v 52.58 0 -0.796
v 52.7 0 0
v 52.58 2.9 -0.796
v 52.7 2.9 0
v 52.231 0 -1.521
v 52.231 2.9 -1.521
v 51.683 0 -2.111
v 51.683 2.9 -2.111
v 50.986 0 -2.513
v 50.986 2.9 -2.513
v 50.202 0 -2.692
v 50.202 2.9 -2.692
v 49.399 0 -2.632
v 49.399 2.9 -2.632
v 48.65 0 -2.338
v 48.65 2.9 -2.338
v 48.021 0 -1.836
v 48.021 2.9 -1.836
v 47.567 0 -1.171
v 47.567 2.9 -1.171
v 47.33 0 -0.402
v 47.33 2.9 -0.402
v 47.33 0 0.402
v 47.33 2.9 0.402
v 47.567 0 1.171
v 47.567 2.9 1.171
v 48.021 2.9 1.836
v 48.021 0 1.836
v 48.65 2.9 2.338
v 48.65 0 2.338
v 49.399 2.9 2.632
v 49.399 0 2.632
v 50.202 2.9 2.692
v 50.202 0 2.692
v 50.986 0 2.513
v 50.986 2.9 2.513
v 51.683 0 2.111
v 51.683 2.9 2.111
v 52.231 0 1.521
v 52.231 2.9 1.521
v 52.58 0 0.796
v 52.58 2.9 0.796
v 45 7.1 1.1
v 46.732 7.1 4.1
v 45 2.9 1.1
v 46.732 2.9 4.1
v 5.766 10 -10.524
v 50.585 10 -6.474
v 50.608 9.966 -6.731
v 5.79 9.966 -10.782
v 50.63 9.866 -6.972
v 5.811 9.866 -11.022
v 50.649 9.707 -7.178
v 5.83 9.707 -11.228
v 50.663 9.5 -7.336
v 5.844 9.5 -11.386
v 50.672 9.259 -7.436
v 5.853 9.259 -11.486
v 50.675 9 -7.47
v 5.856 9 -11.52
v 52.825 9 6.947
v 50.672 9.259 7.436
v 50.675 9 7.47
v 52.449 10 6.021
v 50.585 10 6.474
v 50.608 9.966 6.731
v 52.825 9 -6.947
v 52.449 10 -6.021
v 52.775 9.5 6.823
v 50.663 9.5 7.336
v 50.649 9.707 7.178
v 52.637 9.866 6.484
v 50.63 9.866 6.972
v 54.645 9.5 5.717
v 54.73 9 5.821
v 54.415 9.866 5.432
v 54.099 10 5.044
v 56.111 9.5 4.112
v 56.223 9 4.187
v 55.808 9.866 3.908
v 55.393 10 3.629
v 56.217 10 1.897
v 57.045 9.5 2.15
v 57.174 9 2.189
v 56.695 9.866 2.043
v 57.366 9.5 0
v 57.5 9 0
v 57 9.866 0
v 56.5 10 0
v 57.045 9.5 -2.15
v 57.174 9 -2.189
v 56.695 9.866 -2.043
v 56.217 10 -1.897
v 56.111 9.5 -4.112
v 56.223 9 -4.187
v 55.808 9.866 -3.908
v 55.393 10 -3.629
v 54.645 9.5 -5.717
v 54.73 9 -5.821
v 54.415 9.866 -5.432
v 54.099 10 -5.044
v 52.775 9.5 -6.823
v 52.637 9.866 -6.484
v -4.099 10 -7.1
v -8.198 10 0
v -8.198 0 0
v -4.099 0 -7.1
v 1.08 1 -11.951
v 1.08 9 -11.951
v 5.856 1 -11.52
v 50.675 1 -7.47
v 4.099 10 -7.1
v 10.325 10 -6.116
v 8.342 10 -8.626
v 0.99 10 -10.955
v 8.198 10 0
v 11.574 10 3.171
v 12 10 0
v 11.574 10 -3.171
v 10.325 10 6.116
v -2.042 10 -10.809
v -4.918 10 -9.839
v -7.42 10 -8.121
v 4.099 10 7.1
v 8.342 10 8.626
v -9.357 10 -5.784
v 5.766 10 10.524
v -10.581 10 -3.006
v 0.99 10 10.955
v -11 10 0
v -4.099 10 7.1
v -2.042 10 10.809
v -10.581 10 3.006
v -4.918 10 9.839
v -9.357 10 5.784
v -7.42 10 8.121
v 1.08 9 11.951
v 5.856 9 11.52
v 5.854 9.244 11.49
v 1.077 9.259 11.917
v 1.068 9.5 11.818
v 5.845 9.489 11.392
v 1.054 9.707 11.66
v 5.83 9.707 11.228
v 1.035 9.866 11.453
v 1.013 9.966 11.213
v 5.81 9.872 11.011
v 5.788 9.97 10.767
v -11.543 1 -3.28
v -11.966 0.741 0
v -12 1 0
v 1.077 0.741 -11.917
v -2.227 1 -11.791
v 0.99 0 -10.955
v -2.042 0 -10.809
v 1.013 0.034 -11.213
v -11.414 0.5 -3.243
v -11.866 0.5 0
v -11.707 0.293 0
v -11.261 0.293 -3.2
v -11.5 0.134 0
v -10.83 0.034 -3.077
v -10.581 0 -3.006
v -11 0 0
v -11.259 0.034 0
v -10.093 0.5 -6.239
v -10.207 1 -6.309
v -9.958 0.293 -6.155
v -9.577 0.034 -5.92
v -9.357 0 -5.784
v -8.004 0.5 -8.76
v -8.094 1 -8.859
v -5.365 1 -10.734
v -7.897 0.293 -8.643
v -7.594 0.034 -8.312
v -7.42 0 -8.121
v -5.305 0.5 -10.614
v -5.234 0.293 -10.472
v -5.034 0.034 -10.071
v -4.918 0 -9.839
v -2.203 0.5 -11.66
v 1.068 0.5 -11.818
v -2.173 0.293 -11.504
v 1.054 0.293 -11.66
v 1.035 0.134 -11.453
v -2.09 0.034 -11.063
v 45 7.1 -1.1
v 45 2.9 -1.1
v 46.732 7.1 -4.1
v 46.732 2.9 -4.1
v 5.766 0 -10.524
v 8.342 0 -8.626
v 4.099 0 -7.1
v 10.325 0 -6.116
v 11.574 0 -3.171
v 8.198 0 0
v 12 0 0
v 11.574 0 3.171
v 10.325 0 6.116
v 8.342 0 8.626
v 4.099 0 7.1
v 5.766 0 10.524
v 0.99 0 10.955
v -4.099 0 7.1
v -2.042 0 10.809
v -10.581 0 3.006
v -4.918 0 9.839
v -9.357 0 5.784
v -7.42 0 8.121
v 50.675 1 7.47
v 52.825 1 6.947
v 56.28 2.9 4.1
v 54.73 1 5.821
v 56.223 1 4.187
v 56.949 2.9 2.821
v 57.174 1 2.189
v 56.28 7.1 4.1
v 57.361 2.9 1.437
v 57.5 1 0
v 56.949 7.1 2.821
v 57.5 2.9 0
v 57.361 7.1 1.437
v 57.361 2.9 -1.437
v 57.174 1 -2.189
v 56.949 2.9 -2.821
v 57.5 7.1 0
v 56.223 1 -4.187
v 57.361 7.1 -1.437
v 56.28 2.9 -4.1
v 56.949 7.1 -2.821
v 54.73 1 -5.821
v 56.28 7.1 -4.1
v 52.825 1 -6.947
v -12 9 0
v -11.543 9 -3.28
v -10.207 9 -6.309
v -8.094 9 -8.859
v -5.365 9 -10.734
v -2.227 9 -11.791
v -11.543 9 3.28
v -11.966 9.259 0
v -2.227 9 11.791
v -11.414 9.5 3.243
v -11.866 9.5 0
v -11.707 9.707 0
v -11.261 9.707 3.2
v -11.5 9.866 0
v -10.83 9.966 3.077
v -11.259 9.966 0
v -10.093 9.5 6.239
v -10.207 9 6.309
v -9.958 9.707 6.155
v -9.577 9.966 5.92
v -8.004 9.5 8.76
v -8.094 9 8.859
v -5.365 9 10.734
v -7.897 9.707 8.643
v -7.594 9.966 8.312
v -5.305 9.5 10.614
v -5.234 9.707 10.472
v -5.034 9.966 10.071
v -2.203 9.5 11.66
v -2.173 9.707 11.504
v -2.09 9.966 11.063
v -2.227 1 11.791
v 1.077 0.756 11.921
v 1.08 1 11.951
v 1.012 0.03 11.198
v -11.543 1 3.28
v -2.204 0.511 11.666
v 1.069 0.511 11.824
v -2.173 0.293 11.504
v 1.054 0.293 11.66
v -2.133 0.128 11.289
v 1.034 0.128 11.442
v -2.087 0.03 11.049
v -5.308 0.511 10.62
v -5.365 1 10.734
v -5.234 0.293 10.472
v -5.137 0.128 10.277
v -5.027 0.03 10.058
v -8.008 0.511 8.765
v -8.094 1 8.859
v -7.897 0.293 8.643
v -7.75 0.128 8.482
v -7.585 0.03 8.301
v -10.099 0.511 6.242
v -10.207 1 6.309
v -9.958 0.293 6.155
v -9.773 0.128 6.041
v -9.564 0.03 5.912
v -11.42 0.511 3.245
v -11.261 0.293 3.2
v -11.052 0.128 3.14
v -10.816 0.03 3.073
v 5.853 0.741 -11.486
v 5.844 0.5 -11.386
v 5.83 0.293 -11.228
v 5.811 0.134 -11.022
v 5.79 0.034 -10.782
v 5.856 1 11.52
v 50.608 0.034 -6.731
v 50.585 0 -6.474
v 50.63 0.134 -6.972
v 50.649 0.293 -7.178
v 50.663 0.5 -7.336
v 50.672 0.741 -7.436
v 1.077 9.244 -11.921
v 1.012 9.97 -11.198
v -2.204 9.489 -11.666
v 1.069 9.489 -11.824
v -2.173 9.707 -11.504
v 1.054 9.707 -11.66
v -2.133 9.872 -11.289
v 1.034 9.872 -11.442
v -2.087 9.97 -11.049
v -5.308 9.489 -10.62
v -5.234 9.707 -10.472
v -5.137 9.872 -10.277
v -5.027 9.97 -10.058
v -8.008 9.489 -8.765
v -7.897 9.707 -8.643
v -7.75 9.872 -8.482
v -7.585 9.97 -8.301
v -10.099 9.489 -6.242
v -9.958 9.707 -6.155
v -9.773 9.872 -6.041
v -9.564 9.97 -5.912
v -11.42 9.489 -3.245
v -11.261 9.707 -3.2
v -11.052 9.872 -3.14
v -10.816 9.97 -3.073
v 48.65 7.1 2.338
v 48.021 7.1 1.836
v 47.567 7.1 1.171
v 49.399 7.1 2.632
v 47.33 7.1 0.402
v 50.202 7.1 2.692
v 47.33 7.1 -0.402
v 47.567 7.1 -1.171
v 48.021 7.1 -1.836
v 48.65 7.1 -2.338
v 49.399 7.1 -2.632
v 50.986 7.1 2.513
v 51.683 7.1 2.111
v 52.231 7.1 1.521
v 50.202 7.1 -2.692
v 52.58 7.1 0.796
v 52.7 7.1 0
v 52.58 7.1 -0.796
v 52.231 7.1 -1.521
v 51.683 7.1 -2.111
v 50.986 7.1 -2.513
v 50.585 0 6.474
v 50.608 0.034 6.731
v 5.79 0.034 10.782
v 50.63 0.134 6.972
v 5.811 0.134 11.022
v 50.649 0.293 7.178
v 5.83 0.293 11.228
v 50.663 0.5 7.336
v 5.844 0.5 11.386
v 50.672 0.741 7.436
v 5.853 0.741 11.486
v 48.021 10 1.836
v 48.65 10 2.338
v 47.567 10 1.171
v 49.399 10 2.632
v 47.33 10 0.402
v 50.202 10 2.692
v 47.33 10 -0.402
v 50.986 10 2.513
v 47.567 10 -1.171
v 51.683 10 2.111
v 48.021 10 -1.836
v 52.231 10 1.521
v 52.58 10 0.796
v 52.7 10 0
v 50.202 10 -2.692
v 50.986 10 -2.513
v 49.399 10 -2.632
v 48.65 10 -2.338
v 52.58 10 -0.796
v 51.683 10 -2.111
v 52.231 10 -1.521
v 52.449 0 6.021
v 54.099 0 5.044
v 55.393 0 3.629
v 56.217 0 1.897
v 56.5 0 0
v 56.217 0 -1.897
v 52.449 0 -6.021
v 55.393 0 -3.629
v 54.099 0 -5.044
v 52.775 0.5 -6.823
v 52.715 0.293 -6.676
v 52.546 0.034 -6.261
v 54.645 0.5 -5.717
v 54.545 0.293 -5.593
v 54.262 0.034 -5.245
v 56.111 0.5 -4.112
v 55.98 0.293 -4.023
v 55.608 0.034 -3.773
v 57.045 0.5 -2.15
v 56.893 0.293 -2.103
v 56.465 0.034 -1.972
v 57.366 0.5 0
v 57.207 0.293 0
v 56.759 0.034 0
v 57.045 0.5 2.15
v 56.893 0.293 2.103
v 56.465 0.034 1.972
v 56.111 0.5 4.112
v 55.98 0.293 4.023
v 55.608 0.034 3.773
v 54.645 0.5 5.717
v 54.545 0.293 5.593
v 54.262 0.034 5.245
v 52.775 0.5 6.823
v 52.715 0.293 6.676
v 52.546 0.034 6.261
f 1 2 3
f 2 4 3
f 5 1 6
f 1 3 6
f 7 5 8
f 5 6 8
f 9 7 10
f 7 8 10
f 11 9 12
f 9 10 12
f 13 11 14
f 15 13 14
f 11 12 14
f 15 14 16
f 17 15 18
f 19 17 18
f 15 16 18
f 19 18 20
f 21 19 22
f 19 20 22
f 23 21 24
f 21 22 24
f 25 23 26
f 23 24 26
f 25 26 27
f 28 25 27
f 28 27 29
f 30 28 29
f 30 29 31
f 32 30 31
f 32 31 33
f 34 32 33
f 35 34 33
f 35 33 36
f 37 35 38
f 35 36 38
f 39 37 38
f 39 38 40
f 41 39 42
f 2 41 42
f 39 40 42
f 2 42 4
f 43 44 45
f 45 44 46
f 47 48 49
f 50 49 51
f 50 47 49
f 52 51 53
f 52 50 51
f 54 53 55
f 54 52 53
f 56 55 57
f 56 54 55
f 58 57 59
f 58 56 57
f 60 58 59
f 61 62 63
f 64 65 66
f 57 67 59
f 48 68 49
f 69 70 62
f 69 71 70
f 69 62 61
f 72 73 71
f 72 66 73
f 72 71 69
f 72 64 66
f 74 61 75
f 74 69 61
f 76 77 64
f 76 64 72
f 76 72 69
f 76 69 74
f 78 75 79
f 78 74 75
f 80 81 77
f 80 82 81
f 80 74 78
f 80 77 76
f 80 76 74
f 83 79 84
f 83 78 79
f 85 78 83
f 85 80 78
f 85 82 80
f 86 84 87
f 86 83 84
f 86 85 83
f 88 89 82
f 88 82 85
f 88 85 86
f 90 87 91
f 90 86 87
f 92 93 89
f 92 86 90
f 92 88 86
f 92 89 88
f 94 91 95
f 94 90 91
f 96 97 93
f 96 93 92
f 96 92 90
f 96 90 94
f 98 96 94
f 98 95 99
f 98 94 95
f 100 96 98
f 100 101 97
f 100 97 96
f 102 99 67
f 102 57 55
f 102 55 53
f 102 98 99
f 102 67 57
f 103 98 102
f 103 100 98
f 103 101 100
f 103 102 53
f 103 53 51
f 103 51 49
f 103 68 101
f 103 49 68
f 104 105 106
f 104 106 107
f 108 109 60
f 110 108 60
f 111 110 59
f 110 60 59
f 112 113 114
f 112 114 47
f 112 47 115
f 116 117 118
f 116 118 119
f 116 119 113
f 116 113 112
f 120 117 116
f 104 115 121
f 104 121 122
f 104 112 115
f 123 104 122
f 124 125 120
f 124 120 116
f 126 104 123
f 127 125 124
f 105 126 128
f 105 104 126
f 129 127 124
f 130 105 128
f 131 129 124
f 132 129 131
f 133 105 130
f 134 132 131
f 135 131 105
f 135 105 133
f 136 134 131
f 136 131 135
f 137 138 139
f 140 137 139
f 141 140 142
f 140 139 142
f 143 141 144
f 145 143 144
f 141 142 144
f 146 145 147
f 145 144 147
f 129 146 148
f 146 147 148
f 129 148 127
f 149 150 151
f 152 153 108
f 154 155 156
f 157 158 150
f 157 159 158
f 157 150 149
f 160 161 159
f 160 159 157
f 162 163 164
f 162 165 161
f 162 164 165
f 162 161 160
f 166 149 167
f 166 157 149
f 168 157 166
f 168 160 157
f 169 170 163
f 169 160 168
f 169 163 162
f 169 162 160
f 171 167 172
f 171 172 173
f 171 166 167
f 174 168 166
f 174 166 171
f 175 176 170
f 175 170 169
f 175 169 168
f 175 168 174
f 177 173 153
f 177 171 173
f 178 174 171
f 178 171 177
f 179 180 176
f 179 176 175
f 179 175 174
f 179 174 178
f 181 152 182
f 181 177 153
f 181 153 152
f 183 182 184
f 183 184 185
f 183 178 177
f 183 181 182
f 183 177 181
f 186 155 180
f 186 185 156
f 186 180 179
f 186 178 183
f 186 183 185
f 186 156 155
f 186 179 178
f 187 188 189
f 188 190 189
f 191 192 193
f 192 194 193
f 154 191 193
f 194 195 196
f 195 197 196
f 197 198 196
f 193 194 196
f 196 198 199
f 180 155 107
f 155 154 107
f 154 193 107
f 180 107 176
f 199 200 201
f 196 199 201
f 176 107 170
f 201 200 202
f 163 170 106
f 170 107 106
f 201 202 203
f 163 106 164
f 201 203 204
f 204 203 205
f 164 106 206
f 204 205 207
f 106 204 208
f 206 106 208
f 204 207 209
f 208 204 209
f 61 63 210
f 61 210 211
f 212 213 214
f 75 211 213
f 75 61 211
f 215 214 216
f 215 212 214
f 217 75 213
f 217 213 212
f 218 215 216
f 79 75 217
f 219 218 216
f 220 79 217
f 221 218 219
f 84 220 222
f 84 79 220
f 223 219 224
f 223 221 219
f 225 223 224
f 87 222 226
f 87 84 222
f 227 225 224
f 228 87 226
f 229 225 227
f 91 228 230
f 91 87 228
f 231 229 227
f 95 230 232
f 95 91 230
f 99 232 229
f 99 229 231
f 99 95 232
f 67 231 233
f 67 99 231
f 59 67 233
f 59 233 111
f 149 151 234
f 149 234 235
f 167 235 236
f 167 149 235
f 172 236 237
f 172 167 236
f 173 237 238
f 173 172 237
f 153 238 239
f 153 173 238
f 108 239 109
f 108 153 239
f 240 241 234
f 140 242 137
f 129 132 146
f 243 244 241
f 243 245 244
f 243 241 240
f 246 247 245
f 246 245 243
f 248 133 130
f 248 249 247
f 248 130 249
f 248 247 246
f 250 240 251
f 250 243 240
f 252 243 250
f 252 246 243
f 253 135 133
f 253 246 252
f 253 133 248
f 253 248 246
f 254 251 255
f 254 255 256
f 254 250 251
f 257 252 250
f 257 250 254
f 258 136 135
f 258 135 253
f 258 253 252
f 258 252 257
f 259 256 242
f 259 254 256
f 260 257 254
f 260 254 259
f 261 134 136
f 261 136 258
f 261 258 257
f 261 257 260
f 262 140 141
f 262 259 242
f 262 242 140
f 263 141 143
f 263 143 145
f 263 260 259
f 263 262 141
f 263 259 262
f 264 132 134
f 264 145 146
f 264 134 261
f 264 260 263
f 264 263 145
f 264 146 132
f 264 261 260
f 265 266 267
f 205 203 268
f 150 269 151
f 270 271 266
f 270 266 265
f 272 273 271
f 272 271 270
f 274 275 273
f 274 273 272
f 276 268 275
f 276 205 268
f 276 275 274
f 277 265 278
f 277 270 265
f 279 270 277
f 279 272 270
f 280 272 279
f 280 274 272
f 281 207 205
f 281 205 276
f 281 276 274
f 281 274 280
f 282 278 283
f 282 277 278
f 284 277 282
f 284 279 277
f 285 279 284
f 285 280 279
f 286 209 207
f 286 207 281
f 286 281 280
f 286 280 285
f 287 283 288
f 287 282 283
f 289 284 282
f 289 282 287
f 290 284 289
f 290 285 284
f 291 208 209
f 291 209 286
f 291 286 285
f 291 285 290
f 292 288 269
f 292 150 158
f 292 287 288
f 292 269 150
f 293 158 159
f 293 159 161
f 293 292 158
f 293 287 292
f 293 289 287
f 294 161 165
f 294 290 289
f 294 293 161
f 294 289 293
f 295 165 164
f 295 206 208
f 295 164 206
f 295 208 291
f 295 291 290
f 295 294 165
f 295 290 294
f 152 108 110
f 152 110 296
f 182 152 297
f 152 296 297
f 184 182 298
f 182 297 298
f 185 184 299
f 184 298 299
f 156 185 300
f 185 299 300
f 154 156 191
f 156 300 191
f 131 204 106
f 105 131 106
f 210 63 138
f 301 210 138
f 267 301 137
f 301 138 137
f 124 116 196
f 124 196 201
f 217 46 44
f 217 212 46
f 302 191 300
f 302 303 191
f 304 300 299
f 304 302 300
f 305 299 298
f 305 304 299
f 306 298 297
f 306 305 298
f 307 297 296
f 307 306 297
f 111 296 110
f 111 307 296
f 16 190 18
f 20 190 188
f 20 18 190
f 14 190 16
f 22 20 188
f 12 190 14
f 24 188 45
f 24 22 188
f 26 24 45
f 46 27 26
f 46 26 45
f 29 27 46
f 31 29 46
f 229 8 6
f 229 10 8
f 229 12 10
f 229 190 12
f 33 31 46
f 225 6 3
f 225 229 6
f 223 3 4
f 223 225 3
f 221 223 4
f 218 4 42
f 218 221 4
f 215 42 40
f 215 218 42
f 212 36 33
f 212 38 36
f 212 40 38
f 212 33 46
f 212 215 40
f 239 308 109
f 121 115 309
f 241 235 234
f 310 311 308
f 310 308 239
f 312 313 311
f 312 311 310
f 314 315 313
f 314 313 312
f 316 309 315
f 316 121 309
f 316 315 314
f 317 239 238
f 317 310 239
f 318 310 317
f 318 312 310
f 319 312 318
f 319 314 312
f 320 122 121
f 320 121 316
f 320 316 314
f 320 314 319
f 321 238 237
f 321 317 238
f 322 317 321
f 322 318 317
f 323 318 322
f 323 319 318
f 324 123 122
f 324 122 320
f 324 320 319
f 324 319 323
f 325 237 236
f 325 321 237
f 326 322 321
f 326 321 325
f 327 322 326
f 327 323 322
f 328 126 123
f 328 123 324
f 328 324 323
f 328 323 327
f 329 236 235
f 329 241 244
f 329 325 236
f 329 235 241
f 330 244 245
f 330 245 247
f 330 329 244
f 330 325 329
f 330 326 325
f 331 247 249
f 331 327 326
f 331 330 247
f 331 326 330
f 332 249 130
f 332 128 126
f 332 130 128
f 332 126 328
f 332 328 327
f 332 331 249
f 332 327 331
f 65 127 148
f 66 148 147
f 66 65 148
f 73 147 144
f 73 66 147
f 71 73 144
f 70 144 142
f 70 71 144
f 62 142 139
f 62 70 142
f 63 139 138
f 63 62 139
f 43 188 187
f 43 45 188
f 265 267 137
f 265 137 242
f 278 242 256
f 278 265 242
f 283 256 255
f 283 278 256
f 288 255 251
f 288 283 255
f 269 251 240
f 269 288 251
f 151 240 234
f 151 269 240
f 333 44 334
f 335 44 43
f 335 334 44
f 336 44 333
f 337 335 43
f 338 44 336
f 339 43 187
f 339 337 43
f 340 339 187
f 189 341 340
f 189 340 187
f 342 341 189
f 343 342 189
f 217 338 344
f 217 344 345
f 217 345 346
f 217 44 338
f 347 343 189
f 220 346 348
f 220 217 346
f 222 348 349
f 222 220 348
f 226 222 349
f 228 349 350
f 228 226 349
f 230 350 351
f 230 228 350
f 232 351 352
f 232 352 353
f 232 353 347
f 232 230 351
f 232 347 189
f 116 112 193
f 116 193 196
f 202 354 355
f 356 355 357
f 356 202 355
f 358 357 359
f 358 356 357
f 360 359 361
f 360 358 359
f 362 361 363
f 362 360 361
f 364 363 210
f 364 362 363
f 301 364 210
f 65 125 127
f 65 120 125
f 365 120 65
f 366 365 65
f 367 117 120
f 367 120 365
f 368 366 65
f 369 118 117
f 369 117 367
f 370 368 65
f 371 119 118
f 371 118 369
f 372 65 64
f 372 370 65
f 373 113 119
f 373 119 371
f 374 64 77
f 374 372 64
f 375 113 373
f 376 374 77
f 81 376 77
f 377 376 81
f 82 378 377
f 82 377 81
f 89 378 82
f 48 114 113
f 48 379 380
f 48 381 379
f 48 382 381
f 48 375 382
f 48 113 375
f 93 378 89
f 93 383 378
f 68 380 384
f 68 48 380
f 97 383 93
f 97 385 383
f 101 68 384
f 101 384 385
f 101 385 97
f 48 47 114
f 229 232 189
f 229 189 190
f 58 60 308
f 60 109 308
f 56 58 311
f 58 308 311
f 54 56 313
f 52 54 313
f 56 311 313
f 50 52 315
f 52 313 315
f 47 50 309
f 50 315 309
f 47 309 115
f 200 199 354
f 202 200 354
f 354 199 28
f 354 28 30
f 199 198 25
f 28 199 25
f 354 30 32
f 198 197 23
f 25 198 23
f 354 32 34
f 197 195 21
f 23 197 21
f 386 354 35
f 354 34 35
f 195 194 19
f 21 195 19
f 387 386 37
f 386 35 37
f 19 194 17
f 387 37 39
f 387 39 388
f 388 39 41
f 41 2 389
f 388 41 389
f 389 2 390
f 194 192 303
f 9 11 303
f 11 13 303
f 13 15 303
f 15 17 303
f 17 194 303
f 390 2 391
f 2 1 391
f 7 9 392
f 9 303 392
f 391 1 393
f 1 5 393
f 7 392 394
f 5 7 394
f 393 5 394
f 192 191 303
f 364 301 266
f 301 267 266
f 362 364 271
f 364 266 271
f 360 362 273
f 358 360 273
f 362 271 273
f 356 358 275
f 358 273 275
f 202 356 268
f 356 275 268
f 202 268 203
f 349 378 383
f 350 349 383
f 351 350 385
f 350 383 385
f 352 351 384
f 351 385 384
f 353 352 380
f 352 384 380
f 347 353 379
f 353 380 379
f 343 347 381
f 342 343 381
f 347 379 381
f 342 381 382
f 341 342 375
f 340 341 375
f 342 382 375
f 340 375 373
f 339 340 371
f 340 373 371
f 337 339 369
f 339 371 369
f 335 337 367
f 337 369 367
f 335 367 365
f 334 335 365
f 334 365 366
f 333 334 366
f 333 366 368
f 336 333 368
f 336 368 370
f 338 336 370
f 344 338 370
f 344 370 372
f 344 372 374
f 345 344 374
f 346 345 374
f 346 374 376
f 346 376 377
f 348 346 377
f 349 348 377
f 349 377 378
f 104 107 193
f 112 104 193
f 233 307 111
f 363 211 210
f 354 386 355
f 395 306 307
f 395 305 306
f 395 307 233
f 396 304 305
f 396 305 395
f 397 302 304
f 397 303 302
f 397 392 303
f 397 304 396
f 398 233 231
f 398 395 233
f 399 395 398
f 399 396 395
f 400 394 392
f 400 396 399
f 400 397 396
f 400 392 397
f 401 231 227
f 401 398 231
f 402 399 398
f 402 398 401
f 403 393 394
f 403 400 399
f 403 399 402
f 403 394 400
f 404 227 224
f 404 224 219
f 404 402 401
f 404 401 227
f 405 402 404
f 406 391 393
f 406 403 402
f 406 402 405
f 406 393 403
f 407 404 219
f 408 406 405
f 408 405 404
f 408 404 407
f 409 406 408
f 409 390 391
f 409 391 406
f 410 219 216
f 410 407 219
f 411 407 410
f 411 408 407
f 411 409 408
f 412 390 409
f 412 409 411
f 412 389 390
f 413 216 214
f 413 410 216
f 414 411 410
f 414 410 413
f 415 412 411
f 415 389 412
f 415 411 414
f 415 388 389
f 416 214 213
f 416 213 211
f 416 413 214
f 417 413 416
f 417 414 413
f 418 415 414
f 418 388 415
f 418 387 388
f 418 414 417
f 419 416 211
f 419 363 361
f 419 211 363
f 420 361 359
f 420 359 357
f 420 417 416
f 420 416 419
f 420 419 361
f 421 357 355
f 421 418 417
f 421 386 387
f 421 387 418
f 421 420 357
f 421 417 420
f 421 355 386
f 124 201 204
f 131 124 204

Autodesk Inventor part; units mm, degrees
ref_plane "XZ Plane" through (0, 0, 0) normal (0, 1, 0) x (-1, 0, 0)
ref_plane "XY Plane" through (0, 0, 0) normal (0, 0, 1) x (1, 0, 0)
sketch "Sketch1" plane through (0, 0, 0) normal (0, 1, 0) x (-1, 0, 0)
  circle A0 centre (0, 0) radius 4
  circle A1 centre (0, 0) radius 12
  dimension "d0" = 8
  dimension "d1" = 24
extrude "Extrusion1" add sketch "Sketch1" along normal blind 10
sketch "Sketch2" plane through (0, 10, 0) normal (0, 1, 0) x (1, 0, 0)
  circle A0 centre (0, 0) radius 12 projected
  line L0 (1.08, 11.9513) -> (50.675, 7.4696)
  circle A1 centre (50, 0) radius 7.5
  line L1 (50.675, -7.4696) -> (1.08, -11.9513)
  circle A2 centre (50, 0) radius 2.7
  circle A3 centre (0, 0) radius 12 projected
  point P0 (3.9985, -10.2475)
  point P1 (1.1339, 10.9414)
  dimension "d4" = 50
  dimension "d5" = 15
  dimension "d6" = 5.4
extrude "Extrusion2" add sketch "Sketch2" against normal up to surface (10 mm away) contours A0 L0 A1 L1 | A1
sketch "Sketch3" plane through (0, 10, 0) normal (0, 1, 0) x (1, 0, 0)
  circle A0 centre (0, 0) radius 7.1
  line L0 (8.1984, 0) -> (4.0992, -7.1)
  line L1 (4.0992, -7.1) -> (-4.0992, -7.1)
  line L2 (-4.0992, -7.1) -> (-8.1984, 0)
  line L3 (-8.1984, 0) -> (-4.0992, 7.1)
  line L4 (-4.0992, 7.1) -> (4.0992, 7.1)
  line L5 (4.0992, 7.1) -> (8.1984, 0)
  dimension "d9" = 14.2
extrude "Extrusion3" cut sketch "Sketch3" against normal blind 10
ref_plane "Work Plane1" through (57.5, 10, 0) normal (1, 0, 0) x (0, 1, 0)
sketch "Sketch4" plane through (57.5, 10, 0) normal (1, 0, 0) x (0, 1, 0)
  line L0 (-2.9, -4.1) -> (-7.1, -4.1)
  line L1 (-7.1, -4.1) -> (-7.1, 4.1)
  line L2 (-7.1, 4.1) -> (-2.9, 4.1)
  line L3 (-2.9, 4.1) -> (-2.9, -4.1)
  line L4 (0, 0) -> (-10, 0) projected
  line L5 (-2.9, -4.1) -> (-7.1, 4.1) construction
  line L6 (-7.1, -4.1) -> (-2.9, 4.1) construction
  point P0 (-5, 0)
  dimension "d12" = 4.2
  dimension "d13" = 8.2
extrude "Extrusion4" cut sketch "Sketch4" against normal blind 12.5
chamfer "Chamfer1" distance 3 angle 30 2 edges at (45, 5, -4.1) (45, 5, 4.1) measured on face at (45, 4.3, -1.3667)
fillet "Fillet1" radius 1 8 edges at (-12, 0, 0) (25.8775, 0, -9.7104) (57.5, 0, 0) (25.8775, 0, 9.7104) (57.5, 10, 0) (25.8775, 10, -9.7104) (-12, 10, 0) (25.8775, 10, 9.7104)
properties part number "Crank"
